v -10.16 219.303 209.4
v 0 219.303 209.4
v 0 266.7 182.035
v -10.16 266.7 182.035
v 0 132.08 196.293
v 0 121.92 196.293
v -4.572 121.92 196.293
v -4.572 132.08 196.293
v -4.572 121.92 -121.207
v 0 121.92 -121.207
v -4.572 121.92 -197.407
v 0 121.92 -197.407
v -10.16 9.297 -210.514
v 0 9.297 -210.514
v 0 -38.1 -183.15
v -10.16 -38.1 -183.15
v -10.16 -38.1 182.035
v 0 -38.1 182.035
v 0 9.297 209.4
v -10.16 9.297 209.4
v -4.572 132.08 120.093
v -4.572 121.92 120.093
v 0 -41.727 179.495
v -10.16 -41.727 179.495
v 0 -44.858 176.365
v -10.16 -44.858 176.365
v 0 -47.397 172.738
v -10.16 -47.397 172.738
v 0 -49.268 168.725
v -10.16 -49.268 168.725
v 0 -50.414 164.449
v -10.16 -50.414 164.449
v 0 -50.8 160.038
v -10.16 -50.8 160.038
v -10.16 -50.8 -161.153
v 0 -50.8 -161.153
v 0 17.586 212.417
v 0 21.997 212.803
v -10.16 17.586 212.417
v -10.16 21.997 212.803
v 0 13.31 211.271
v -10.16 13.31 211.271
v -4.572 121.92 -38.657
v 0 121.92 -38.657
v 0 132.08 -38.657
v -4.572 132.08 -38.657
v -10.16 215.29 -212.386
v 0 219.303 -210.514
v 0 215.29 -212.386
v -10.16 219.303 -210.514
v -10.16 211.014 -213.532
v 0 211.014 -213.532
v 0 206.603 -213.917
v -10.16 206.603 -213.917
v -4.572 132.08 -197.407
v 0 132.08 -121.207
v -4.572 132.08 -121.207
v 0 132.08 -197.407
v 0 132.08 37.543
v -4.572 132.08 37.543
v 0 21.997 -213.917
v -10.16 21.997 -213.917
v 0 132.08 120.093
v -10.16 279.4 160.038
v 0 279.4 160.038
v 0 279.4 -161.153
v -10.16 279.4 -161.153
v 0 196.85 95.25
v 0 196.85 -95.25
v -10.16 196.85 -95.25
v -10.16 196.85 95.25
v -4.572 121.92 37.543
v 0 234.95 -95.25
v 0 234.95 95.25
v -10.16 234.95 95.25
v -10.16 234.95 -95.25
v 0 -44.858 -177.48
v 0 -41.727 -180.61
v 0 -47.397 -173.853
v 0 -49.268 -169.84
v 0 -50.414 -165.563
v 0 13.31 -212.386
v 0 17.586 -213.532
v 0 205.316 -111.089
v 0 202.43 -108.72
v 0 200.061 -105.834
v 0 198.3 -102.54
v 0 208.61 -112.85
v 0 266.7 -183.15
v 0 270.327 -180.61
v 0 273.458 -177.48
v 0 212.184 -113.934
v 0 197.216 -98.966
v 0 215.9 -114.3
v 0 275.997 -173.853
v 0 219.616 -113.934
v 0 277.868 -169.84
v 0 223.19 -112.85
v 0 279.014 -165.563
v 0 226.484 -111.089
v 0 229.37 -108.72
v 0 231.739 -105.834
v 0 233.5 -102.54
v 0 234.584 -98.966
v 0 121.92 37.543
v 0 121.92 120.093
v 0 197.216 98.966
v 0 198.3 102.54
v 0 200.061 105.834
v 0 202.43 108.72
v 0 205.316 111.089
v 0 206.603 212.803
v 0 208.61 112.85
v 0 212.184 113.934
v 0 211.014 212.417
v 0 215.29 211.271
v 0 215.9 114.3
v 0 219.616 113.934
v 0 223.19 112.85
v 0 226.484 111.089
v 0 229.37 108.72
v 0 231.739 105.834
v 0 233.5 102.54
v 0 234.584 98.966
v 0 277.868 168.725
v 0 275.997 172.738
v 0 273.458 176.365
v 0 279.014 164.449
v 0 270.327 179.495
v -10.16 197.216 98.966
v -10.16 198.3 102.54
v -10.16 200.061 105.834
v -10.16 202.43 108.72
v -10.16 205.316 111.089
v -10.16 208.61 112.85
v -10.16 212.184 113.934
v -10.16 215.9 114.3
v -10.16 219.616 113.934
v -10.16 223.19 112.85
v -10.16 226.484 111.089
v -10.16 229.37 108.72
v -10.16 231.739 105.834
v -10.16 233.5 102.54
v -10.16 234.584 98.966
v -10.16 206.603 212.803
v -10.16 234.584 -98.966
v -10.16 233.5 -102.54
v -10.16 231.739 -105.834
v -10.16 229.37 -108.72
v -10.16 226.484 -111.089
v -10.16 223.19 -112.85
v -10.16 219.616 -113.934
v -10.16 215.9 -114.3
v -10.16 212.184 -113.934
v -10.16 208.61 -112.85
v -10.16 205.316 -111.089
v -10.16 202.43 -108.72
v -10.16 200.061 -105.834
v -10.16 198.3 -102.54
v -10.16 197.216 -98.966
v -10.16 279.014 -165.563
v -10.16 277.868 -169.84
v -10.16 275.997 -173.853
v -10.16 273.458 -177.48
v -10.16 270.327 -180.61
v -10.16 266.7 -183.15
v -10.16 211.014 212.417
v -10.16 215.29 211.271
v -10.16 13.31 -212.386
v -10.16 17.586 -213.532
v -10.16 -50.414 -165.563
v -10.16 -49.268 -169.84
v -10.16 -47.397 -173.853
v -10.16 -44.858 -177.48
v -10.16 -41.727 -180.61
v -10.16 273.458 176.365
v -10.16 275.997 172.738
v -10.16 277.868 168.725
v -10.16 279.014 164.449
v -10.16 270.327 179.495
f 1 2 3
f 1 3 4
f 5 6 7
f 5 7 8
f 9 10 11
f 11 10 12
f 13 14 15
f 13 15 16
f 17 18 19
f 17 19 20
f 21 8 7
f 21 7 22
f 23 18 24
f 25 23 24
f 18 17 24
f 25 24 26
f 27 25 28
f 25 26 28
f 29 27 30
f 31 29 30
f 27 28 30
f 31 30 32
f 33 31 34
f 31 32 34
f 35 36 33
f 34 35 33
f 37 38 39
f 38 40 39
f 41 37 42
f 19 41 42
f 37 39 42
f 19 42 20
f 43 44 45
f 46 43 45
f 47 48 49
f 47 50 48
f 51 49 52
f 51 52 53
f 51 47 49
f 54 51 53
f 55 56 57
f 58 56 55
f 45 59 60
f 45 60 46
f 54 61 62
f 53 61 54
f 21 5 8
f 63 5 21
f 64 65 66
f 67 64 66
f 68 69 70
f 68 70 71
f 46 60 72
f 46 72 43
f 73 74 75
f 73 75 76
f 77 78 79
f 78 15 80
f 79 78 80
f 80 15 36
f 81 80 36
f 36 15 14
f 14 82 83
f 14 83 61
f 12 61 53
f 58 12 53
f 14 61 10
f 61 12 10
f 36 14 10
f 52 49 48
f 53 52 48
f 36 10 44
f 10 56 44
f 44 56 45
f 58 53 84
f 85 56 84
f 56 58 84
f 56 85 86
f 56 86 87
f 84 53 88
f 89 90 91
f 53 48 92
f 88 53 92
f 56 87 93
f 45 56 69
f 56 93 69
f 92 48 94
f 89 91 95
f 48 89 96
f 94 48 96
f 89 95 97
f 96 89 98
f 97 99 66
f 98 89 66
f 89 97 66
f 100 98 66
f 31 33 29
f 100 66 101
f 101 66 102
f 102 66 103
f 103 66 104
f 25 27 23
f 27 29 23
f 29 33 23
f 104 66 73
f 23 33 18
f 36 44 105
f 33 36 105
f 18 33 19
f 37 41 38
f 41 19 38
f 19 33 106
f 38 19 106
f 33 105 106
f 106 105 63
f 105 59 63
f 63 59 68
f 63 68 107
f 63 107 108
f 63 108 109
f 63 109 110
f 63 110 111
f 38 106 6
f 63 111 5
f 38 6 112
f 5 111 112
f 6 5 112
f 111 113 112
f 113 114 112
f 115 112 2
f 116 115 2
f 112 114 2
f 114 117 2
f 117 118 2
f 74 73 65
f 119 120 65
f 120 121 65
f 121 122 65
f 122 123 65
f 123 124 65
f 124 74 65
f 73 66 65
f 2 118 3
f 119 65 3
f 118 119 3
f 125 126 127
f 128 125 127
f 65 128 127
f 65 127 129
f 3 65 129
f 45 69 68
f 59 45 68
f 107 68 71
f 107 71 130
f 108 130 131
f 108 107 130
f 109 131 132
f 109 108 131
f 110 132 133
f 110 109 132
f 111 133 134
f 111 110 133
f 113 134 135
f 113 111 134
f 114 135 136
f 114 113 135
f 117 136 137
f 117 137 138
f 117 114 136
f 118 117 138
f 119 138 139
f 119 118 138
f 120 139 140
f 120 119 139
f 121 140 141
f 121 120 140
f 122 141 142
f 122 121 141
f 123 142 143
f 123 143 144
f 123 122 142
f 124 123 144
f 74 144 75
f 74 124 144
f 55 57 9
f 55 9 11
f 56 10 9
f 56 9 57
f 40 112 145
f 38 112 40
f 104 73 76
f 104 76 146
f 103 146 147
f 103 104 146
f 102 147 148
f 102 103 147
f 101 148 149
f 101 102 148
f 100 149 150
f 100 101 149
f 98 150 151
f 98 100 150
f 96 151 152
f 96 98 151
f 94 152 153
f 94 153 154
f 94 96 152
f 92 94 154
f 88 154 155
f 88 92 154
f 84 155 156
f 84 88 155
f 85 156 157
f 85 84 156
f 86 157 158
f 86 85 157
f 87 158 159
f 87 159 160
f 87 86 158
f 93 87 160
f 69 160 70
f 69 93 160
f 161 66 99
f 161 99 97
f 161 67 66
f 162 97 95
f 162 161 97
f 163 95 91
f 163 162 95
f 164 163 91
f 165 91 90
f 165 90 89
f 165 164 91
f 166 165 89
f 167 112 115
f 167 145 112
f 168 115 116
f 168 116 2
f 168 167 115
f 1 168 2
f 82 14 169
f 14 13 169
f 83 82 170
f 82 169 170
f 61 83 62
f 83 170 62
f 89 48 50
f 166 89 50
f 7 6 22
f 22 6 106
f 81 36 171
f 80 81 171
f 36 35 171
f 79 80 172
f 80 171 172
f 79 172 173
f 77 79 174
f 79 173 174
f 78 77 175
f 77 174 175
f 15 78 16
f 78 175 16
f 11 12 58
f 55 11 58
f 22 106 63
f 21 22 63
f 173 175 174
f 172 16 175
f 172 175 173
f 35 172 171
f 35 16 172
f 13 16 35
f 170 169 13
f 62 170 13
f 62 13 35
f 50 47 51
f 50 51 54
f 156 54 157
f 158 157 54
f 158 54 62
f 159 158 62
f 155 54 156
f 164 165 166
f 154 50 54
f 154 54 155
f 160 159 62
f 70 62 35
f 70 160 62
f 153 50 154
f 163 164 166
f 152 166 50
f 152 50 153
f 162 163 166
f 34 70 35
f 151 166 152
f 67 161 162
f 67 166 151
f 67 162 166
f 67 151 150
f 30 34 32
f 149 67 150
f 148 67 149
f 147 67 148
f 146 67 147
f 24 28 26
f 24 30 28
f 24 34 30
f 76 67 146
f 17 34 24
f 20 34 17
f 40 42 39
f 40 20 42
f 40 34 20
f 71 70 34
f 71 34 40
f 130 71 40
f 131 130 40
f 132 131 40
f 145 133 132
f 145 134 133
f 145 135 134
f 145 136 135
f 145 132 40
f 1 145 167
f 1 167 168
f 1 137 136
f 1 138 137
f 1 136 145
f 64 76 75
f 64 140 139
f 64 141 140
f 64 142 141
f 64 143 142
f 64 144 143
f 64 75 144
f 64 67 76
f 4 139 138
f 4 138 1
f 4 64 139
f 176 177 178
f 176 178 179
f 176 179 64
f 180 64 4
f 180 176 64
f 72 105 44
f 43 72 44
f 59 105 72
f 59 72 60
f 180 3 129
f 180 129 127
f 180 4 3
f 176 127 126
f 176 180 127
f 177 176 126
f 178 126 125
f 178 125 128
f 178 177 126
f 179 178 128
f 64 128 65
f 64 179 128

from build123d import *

# Parameters (mm, degrees)
BOSS_EXTRUDE1_DEPTH   = 10.16
SKETCH2_W             = 76.2
SKETCH2_H             = 10.16
CUT_EXTRUDE1_DEPTH    = 4.572
CHAMFER1_SIZE         = 38.1
CHAMFER1_SIZE2        = 65.991135768
CHAMFER1_PART_2_SIZE  = 38.1
CHAMFER1_PART_2_SIZE2 = 65.991135768
FILLET1_R             = 25.4


with BuildPart() as part:
    # Sketch1 → Boss-Extrude1 (new body)
    with BuildSketch(Plane(origin=(0, 0, 0), x_dir=(0, 0, -1), z_dir=(1, 0, 0))):
        Polygon((-212.802604436, 0), (-212.802604436, 254), (-212.802604436, 279.4), (213.917395564, 279.4), (213.917395564, 254), (213.917395564, 0), (213.917395564, -50.8), (-212.802604436, -50.8), align=None)
        with BuildLine():
            Line((-95.25, 234.95), (95.25, 234.95))
            ThreePointArc((95.25, 234.95), (114.3, 215.9), (95.25, 196.85))
            Line((95.25, 196.85), (-95.25, 196.85))
            ThreePointArc((-95.25, 196.85), (-114.3, 215.9), (-95.25, 234.95))
        make_face(mode=Mode.SUBTRACT)
    extrude(amount=-BOSS_EXTRUDE1_DEPTH)

    # Sketch2 → Cut-Extrude1 (cut)
    with BuildSketch(Plane(origin=(0, 0, 0), x_dir=(0, 0, -1), z_dir=(1, 0, 0))):
        with Locations((-158.192604436, 127)):
            Rectangle(SKETCH2_W, SKETCH2_H)
        with Locations((0.557395564, 127)):
            Rectangle(SKETCH2_W, SKETCH2_H)
        with Locations((159.307395564, 127)):
            Rectangle(SKETCH2_W, SKETCH2_H)
    extrude(amount=-CUT_EXTRUDE1_DEPTH, mode=Mode.SUBTRACT)

    # Chamfer1
    chamfer1_edges = [part.edges().sort_by_distance(p)[0] for p in [
        (-5.08, 279.4, 212.802604436),
        (-5.08, 279.4, -213.917395564),
    ]]
    chamfer1_side = [part.faces().sort_by_distance(p)[0] for p in [
        (-5.08, 279.4, -0.557395564),
    ]]
    chamfer(chamfer1_edges, length=CHAMFER1_SIZE, length2=CHAMFER1_SIZE2, reference=chamfer1_side[0])

    # Chamfer1 part 2
    chamfer1_part_2_edges = [part.edges().sort_by_distance(p)[0] for p in [
        (-5.08, -50.8, -213.917395564),
        (-5.08, -50.8, 212.802604436),
    ]]
    chamfer1_part_2_side = [part.faces().sort_by_distance(p)[0] for p in [
        (-5.08, -50.8, -0.557395564),
    ]]
    chamfer(chamfer1_part_2_edges, length=CHAMFER1_PART_2_SIZE, length2=CHAMFER1_PART_2_SIZE2, reference=chamfer1_part_2_side[0])

    # Fillet1
    fillet1_edges = [part.edges().sort_by_distance(p)[0] for p in [
        (-5.08, -50.8, 174.702604436),
        (-5.08, -50.8, -175.817395564),
        (-5.08, 213.408864232, -213.917395564),
        (-5.08, 15.191135768, -213.917395564),
        (-5.08, 279.4, -175.817395564),
        (-5.08, 279.4, 174.702604436),
        (-5.08, 15.191135768, 212.802604436),
        (-5.08, 213.408864232, 212.802604436),
    ]]
    fillet(fillet1_edges, radius=FILLET1_R)


solid = part.part
